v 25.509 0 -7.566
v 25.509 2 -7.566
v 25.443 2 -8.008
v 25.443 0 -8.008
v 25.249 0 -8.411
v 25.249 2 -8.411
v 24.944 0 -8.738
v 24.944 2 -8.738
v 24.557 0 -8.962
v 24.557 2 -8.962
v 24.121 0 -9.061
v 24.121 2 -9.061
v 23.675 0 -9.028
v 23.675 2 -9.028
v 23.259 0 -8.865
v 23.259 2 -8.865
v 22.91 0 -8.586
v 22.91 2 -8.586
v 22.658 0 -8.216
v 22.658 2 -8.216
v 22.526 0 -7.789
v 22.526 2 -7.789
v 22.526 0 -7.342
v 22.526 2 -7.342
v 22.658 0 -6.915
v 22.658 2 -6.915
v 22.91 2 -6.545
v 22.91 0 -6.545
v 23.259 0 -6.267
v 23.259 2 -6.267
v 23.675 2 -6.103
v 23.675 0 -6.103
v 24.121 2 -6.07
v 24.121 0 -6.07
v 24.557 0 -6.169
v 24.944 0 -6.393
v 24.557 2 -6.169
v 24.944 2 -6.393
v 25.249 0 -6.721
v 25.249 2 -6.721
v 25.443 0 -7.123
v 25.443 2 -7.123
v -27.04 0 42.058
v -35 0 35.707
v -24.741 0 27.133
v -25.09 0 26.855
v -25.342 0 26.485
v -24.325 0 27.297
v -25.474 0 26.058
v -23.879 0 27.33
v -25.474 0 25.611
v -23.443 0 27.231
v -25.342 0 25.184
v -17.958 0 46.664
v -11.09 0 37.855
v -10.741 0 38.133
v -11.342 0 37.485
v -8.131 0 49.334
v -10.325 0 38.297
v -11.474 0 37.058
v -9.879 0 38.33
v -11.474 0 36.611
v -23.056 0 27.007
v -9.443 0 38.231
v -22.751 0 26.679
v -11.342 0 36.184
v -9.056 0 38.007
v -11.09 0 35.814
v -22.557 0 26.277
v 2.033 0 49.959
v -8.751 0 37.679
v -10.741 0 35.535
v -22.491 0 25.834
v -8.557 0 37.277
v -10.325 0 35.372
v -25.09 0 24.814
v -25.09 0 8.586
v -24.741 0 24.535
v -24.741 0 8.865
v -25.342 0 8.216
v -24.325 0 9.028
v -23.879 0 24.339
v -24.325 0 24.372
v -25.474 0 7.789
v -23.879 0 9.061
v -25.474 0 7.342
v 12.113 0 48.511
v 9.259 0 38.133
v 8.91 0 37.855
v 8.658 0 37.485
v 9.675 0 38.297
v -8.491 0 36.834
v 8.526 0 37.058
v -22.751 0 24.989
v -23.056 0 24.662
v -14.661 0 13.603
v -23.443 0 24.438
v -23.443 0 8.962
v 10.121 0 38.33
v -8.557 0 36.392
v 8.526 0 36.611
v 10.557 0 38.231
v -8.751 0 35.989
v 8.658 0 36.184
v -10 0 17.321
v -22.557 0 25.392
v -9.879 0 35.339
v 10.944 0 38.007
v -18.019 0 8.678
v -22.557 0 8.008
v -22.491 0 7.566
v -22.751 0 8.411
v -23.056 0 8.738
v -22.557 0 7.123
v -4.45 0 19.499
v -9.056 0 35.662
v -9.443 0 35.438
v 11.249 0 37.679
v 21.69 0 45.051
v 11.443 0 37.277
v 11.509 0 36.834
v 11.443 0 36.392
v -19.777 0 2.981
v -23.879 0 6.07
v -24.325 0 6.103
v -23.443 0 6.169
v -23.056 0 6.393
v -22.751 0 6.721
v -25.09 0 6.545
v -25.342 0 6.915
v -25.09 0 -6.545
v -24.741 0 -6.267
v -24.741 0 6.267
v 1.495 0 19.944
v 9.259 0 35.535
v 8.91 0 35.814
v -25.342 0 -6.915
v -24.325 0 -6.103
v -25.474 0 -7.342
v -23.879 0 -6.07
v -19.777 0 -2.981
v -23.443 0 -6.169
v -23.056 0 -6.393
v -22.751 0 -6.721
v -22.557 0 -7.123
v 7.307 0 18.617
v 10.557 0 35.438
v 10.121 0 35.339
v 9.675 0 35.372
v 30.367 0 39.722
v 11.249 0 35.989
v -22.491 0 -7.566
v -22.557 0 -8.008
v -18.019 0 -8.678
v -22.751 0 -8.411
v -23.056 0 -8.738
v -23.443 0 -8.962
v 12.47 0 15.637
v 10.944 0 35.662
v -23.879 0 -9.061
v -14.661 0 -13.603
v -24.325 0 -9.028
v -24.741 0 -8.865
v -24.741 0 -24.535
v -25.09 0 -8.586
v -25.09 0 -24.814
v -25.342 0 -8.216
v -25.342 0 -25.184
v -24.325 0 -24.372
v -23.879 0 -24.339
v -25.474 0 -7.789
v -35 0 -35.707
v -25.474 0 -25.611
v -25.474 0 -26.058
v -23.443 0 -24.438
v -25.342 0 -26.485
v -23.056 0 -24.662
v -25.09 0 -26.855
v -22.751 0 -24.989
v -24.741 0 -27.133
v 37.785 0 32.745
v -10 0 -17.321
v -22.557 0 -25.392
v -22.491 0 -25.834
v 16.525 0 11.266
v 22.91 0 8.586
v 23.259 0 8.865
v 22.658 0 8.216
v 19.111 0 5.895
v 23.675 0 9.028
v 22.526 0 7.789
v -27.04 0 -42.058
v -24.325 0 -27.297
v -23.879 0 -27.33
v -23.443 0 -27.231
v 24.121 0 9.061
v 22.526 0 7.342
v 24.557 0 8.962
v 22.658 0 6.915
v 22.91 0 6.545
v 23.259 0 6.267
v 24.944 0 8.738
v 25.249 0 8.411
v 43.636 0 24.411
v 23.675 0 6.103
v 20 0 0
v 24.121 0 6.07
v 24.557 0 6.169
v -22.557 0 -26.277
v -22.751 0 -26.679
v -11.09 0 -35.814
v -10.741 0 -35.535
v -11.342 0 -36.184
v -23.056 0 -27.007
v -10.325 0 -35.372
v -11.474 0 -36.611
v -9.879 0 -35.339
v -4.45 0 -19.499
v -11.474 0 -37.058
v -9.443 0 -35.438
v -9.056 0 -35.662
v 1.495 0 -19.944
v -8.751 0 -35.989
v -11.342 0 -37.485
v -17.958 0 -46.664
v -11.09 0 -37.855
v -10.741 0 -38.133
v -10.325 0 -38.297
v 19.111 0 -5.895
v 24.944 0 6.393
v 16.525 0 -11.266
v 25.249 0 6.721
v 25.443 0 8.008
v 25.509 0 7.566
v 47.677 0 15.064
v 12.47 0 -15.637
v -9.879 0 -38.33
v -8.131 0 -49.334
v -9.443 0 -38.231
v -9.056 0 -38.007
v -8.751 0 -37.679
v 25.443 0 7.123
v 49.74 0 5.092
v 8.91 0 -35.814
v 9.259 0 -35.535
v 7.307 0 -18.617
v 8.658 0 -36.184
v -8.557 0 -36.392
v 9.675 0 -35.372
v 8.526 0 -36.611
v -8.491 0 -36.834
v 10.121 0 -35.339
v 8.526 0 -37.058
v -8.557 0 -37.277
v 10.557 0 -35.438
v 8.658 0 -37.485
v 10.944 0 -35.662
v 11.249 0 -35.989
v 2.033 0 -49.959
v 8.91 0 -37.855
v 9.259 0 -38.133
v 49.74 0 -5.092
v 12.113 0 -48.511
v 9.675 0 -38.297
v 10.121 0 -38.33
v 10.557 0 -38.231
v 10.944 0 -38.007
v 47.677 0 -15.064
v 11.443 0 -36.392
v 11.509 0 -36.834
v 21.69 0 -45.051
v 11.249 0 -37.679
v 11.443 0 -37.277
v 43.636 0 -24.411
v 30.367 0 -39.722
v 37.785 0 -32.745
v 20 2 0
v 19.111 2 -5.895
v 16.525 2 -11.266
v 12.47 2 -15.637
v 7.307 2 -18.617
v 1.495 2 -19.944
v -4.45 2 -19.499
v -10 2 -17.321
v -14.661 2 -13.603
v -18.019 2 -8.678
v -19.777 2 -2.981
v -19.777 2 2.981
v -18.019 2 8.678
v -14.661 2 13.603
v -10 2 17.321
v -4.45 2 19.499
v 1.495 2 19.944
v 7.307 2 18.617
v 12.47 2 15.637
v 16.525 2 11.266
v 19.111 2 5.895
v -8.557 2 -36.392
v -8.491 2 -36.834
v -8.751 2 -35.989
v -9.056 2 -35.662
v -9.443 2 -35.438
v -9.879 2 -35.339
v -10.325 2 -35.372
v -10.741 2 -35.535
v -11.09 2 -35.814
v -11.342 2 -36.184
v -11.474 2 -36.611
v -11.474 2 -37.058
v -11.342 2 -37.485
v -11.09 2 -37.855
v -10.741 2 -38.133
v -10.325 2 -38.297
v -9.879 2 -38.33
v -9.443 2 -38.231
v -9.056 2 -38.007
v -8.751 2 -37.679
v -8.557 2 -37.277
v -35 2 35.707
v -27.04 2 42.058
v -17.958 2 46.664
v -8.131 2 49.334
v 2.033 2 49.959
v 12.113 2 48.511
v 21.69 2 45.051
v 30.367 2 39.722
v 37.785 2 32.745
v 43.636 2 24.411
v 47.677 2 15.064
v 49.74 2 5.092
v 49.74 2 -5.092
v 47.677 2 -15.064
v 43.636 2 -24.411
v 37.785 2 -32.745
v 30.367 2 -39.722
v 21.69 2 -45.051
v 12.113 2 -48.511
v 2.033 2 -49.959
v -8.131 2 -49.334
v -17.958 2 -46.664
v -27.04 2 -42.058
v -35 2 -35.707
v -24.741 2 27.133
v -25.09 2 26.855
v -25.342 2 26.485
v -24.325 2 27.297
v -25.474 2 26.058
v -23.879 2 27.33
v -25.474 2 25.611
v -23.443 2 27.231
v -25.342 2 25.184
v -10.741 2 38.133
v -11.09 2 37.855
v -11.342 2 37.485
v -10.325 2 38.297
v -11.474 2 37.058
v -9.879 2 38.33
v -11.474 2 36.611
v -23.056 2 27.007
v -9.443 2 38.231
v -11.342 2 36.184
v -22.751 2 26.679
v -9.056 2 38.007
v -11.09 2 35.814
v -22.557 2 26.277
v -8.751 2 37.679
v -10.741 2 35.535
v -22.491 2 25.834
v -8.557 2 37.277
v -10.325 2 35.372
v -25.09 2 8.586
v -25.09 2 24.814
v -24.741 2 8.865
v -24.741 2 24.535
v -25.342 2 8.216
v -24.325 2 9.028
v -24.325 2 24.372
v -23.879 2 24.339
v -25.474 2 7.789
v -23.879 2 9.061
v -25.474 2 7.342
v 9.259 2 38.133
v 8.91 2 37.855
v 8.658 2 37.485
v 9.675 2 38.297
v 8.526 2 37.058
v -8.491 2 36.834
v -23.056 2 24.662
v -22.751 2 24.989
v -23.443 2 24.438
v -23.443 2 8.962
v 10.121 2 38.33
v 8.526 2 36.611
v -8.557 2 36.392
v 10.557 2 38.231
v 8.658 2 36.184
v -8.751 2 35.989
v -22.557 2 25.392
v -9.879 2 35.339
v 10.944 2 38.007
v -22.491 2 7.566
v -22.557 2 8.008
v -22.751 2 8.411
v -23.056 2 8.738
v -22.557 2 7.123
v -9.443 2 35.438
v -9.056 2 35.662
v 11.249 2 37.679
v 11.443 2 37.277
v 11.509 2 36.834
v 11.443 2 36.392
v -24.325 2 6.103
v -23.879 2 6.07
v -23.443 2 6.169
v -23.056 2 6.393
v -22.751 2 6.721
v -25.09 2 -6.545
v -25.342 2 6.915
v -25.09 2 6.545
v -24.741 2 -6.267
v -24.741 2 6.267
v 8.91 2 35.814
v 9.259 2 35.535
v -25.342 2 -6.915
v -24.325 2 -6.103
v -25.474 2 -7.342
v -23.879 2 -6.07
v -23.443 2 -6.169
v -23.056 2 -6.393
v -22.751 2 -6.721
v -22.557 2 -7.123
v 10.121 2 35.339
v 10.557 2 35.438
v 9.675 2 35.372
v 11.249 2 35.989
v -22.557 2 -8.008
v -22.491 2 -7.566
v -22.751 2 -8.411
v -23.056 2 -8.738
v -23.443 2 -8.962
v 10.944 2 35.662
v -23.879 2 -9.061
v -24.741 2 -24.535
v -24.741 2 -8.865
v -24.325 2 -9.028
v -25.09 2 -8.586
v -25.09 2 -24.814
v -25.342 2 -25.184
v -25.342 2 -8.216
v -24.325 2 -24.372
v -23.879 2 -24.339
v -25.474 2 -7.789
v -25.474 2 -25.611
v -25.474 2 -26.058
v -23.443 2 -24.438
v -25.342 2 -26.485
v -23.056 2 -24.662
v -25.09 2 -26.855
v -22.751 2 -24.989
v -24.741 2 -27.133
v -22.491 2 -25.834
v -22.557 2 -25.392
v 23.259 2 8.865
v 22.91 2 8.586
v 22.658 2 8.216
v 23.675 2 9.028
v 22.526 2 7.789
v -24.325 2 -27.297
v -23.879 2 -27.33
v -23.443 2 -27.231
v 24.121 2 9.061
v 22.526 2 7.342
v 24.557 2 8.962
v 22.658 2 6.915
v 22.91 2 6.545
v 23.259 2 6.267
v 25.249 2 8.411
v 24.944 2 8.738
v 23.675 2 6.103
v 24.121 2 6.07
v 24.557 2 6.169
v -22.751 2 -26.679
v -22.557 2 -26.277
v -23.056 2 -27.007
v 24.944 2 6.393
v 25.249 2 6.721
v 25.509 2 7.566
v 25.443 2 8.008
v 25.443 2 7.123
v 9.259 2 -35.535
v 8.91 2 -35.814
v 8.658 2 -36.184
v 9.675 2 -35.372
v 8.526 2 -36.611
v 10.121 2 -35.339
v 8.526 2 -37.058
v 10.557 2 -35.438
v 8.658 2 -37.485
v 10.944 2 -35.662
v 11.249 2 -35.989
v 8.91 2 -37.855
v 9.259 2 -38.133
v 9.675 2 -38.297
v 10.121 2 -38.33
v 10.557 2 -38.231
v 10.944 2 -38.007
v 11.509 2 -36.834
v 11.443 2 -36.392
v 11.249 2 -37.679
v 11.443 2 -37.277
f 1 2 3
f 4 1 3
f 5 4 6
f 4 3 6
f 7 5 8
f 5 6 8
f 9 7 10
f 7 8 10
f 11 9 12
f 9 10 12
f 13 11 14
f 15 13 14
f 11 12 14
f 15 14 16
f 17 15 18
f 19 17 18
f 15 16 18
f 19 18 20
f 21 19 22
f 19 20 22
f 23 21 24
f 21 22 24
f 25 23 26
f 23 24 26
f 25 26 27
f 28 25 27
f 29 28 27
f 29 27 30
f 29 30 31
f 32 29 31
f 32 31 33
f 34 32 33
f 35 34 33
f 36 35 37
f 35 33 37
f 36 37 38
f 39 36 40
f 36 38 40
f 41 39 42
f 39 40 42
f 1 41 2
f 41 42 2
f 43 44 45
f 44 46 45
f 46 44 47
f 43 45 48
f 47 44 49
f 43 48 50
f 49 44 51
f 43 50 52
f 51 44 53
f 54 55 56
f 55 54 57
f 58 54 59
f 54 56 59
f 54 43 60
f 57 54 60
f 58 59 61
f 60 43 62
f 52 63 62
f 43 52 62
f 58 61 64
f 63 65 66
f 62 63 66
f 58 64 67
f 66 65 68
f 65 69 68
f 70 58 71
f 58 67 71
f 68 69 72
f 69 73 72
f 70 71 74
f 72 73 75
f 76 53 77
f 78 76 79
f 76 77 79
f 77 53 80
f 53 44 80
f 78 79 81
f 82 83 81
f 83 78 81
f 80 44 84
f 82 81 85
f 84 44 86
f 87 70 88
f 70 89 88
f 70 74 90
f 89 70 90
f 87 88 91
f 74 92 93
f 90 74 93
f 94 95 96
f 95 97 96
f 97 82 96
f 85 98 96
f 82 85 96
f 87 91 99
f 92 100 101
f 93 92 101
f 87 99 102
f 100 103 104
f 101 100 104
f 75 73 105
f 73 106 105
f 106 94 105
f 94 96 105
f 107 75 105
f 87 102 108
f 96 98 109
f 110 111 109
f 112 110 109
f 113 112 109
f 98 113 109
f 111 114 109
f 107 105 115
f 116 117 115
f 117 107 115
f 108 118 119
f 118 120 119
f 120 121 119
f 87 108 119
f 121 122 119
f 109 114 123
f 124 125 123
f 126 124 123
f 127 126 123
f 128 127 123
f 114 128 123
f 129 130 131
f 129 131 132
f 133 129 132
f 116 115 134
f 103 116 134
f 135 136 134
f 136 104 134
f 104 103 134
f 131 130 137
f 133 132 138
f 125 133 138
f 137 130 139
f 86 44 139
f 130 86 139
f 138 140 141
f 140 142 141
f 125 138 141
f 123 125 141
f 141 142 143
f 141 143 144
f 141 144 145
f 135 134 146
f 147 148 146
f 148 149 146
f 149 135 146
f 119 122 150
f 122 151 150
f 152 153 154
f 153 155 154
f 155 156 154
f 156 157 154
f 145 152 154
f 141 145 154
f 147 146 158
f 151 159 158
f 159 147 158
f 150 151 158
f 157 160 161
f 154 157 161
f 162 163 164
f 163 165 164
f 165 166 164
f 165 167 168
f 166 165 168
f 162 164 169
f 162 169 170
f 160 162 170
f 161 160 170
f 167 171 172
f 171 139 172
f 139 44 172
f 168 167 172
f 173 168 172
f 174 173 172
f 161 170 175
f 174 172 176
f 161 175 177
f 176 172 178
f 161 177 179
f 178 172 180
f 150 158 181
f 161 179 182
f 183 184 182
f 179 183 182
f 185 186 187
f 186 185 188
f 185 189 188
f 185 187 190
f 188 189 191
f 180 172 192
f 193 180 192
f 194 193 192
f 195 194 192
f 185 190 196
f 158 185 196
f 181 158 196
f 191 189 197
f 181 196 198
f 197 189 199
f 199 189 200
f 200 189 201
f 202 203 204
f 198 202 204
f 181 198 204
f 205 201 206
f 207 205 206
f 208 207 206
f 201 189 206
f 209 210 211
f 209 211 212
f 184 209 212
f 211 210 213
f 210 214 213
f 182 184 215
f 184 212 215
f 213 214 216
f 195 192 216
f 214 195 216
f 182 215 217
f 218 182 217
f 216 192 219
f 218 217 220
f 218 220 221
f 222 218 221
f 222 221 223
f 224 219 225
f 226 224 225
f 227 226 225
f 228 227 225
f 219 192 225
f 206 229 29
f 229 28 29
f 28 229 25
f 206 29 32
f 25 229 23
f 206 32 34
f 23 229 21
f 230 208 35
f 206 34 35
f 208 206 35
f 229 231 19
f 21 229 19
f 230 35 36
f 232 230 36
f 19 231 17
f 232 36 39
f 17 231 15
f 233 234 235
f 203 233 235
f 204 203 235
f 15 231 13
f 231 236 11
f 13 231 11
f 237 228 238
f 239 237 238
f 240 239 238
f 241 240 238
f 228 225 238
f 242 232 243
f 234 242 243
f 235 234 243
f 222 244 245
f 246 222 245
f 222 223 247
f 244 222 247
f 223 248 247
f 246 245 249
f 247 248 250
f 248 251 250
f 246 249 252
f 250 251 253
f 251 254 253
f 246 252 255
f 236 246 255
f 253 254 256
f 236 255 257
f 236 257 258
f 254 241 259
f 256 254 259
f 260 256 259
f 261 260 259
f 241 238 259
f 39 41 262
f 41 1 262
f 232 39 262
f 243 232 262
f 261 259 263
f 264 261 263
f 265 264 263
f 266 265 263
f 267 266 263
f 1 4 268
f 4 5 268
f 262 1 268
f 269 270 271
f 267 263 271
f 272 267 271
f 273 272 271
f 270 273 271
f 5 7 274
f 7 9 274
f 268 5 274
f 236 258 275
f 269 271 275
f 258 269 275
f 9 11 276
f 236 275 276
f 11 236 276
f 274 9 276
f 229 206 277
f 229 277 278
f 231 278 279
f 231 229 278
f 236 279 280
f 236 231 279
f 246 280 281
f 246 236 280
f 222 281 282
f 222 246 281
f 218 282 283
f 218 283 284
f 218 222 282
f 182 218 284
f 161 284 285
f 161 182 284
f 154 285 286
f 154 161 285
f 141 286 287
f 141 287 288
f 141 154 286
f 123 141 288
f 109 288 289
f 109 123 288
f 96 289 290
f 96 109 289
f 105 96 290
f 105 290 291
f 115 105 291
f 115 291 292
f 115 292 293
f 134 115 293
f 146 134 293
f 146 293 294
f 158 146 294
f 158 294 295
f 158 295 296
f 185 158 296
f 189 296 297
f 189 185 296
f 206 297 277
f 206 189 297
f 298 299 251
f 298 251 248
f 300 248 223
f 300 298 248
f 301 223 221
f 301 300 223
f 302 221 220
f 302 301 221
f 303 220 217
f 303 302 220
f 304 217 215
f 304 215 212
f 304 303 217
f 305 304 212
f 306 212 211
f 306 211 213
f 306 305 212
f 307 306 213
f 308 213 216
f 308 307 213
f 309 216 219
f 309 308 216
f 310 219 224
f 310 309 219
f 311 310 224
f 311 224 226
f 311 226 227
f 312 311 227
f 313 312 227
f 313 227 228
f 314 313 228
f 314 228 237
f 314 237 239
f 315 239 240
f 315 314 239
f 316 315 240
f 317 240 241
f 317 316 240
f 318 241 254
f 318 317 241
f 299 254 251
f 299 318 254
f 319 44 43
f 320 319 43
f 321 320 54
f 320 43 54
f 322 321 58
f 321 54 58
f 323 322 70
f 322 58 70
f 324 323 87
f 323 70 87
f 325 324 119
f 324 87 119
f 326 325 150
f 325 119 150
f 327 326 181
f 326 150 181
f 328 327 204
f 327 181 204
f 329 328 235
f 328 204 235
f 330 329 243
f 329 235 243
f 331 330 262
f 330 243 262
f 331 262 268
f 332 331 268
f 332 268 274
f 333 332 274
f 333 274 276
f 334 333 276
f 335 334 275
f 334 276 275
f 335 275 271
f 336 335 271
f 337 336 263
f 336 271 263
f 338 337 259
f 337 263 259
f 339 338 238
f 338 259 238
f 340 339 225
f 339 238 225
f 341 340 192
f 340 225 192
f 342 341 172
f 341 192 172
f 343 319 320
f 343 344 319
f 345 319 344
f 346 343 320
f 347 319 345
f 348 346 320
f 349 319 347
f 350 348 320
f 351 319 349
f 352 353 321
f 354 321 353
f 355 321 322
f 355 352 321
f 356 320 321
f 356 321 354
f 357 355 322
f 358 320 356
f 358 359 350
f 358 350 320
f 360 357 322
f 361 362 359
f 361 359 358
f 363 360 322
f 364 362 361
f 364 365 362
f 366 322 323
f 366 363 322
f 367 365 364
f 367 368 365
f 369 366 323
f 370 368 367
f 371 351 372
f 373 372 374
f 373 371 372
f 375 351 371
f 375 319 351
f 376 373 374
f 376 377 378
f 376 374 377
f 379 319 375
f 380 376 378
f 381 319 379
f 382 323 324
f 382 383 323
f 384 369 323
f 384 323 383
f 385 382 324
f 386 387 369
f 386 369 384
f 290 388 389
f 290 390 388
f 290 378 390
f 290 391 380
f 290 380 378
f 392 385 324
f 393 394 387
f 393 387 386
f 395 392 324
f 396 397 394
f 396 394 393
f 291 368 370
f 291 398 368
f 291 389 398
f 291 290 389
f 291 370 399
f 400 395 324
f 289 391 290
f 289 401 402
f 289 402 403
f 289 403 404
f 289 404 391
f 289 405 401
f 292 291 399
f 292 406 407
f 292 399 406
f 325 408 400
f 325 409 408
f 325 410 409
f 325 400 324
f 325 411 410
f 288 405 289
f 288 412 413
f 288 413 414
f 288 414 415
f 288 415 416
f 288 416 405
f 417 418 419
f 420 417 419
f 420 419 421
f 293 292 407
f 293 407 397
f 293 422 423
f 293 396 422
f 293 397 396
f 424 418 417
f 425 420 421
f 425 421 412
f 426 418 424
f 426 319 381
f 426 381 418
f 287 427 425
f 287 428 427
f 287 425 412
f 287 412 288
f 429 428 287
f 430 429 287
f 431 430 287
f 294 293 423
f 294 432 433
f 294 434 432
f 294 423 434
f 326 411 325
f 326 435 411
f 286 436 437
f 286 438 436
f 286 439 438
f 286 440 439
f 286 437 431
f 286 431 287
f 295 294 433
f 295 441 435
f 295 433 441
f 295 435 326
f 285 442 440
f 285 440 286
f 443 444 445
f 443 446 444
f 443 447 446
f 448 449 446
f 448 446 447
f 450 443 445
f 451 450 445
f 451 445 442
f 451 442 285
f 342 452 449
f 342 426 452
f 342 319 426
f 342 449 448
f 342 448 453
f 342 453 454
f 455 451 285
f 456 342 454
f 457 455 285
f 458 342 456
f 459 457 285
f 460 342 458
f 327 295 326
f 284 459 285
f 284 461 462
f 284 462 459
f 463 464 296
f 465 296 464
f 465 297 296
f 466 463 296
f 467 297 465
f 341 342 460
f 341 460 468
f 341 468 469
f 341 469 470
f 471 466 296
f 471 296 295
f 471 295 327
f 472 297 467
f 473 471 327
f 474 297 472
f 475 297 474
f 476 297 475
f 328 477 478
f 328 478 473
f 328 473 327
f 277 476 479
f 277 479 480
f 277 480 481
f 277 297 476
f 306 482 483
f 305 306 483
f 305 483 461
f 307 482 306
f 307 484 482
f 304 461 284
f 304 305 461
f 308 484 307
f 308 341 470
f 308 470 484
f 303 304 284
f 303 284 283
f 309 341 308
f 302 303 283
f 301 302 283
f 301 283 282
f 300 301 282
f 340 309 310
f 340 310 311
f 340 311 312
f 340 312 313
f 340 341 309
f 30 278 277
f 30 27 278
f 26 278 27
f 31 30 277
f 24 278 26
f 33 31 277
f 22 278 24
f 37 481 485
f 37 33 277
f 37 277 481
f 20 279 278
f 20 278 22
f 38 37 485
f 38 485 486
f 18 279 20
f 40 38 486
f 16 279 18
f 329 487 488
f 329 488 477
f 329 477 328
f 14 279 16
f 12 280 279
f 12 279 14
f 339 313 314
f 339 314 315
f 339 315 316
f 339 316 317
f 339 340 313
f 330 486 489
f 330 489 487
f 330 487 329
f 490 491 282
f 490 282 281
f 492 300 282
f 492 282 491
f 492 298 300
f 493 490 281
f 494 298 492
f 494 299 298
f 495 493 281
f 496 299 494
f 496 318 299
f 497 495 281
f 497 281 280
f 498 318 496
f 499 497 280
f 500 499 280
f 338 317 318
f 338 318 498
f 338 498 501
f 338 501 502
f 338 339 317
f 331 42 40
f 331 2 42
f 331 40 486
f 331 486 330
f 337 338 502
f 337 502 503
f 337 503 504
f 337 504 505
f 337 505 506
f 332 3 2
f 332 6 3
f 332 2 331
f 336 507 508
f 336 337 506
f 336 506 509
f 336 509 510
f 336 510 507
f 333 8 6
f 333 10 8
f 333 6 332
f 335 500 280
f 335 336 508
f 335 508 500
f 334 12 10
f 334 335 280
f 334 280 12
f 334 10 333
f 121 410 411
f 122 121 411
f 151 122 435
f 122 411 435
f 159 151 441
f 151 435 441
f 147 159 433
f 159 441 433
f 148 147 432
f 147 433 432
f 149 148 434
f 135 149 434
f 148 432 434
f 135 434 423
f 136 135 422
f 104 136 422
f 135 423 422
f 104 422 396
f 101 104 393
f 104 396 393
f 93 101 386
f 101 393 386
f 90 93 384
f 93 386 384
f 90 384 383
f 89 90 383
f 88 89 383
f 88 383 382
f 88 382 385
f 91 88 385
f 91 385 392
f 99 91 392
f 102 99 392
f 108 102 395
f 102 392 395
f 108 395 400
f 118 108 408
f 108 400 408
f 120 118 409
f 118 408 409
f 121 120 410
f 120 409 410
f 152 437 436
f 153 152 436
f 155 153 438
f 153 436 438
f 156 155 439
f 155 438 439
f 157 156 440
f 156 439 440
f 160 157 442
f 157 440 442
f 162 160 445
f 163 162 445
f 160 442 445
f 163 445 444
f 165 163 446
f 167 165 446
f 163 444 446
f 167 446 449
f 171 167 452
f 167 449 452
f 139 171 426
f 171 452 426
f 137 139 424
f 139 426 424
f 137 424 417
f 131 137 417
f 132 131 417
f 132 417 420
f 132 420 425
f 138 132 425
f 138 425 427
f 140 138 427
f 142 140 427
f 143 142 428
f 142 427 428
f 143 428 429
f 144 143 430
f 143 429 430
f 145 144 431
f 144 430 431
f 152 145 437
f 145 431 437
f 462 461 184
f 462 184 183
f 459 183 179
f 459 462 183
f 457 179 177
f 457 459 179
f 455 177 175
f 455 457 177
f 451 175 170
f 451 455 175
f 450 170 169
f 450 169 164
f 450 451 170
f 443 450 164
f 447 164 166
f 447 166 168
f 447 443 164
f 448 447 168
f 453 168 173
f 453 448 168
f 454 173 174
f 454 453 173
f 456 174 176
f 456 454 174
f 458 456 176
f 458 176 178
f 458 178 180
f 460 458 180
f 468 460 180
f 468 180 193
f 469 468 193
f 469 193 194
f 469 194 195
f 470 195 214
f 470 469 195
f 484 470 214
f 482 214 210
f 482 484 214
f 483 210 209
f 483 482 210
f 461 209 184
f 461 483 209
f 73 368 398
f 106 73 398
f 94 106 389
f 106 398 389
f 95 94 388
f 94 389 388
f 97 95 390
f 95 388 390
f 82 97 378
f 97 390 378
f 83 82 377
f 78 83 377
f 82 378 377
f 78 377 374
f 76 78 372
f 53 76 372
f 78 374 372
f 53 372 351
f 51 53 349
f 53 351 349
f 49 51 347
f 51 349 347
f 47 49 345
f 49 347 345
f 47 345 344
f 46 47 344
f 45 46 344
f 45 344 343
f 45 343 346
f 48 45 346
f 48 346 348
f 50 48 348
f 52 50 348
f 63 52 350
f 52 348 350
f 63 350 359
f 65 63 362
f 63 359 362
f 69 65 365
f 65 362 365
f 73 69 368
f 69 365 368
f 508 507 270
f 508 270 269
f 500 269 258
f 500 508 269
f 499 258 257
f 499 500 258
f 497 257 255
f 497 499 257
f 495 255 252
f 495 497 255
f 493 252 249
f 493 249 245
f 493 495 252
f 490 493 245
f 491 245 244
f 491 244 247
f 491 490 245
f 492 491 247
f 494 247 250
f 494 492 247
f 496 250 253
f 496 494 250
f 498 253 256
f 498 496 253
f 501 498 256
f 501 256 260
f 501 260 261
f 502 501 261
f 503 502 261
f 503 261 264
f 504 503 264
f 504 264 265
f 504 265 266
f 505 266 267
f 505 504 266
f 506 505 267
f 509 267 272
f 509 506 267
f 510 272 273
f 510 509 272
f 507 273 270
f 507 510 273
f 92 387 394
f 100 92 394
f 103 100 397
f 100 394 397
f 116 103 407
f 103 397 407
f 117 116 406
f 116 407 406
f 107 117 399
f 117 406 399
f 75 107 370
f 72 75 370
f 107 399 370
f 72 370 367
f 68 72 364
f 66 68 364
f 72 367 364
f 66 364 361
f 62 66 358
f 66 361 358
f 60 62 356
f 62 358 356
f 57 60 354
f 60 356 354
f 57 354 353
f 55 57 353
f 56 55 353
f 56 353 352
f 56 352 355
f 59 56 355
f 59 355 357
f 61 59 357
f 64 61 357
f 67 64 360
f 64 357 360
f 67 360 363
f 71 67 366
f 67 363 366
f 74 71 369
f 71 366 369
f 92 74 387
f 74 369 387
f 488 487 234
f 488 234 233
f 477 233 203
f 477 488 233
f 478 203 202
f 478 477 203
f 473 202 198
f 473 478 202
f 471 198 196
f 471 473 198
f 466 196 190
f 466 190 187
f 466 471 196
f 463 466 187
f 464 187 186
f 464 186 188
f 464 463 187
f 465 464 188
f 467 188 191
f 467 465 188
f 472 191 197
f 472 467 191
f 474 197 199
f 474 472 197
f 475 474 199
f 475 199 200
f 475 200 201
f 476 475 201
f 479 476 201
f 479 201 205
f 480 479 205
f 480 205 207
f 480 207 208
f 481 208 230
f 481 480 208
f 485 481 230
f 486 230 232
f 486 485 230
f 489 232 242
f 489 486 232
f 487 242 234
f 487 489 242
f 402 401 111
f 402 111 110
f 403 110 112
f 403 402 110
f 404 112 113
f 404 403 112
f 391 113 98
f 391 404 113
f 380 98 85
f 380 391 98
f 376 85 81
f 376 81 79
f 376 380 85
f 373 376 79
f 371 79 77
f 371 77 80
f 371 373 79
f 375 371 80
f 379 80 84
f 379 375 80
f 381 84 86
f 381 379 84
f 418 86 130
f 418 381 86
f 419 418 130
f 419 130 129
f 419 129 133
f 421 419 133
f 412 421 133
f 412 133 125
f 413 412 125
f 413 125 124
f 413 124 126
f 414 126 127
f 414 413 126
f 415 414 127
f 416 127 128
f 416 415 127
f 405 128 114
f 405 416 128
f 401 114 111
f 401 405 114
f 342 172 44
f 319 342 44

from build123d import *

# Parameters (mm, degrees)
SKETCH1_R           = 20
BOSS_EXTRUDE1_DEPTH = 2
SKETCH2_R           = 1.5
SKETCH2_R_2         = 1
CUT_EXTRUDE1_DEPTH  = 2


with BuildPart() as part:
    # Sketch1 → Boss-Extrude1 (new body)
    with BuildSketch(Plane(origin=(0, 0, 0), x_dir=(1, 0, 0), z_dir=(0, 1, 0))):
        with BuildLine():
            Line((-35, 35.707142143), (-35, -35.707142143))
            ThreePointArc((-35, -35.707142143), (50, 0), (-35, 35.707142143))
        make_face()
        Circle(SKETCH1_R, mode=Mode.SUBTRACT)
    extrude(amount=BOSS_EXTRUDE1_DEPTH)

    # Sketch2 → Cut-Extrude1 (cut)
    with BuildSketch(Plane(origin=(0, 2, 0), x_dir=(1, 0, 0), z_dir=(0, 1, 0))):
        with Locations((-23.99076058, 7.565582695)):
            Circle(SKETCH2_R)
        with Locations((24.00923942, 7.565582695)):
            Circle(SKETCH2_R)
        with Locations((-23.99076058, -25.834417305)):
            Circle(SKETCH2_R)
        with Locations((-9.99076058, -36.834417305)):
            Circle(SKETCH2_R)
        with Locations((10.00923942, -36.834417305)):
            Circle(SKETCH2_R)
        with Locations((0.00923942, 0.065582695)):
            Circle(SKETCH2_R_2)
    cut_extrude1 = extrude(amount=-CUT_EXTRUDE1_DEPTH, mode=Mode.SUBTRACT)

    # Mirror1: Cut-Extrude1 across plane
    add(cut_extrude1.mirror(Plane.XY), mode=Mode.SUBTRACT)


solid = part.part
